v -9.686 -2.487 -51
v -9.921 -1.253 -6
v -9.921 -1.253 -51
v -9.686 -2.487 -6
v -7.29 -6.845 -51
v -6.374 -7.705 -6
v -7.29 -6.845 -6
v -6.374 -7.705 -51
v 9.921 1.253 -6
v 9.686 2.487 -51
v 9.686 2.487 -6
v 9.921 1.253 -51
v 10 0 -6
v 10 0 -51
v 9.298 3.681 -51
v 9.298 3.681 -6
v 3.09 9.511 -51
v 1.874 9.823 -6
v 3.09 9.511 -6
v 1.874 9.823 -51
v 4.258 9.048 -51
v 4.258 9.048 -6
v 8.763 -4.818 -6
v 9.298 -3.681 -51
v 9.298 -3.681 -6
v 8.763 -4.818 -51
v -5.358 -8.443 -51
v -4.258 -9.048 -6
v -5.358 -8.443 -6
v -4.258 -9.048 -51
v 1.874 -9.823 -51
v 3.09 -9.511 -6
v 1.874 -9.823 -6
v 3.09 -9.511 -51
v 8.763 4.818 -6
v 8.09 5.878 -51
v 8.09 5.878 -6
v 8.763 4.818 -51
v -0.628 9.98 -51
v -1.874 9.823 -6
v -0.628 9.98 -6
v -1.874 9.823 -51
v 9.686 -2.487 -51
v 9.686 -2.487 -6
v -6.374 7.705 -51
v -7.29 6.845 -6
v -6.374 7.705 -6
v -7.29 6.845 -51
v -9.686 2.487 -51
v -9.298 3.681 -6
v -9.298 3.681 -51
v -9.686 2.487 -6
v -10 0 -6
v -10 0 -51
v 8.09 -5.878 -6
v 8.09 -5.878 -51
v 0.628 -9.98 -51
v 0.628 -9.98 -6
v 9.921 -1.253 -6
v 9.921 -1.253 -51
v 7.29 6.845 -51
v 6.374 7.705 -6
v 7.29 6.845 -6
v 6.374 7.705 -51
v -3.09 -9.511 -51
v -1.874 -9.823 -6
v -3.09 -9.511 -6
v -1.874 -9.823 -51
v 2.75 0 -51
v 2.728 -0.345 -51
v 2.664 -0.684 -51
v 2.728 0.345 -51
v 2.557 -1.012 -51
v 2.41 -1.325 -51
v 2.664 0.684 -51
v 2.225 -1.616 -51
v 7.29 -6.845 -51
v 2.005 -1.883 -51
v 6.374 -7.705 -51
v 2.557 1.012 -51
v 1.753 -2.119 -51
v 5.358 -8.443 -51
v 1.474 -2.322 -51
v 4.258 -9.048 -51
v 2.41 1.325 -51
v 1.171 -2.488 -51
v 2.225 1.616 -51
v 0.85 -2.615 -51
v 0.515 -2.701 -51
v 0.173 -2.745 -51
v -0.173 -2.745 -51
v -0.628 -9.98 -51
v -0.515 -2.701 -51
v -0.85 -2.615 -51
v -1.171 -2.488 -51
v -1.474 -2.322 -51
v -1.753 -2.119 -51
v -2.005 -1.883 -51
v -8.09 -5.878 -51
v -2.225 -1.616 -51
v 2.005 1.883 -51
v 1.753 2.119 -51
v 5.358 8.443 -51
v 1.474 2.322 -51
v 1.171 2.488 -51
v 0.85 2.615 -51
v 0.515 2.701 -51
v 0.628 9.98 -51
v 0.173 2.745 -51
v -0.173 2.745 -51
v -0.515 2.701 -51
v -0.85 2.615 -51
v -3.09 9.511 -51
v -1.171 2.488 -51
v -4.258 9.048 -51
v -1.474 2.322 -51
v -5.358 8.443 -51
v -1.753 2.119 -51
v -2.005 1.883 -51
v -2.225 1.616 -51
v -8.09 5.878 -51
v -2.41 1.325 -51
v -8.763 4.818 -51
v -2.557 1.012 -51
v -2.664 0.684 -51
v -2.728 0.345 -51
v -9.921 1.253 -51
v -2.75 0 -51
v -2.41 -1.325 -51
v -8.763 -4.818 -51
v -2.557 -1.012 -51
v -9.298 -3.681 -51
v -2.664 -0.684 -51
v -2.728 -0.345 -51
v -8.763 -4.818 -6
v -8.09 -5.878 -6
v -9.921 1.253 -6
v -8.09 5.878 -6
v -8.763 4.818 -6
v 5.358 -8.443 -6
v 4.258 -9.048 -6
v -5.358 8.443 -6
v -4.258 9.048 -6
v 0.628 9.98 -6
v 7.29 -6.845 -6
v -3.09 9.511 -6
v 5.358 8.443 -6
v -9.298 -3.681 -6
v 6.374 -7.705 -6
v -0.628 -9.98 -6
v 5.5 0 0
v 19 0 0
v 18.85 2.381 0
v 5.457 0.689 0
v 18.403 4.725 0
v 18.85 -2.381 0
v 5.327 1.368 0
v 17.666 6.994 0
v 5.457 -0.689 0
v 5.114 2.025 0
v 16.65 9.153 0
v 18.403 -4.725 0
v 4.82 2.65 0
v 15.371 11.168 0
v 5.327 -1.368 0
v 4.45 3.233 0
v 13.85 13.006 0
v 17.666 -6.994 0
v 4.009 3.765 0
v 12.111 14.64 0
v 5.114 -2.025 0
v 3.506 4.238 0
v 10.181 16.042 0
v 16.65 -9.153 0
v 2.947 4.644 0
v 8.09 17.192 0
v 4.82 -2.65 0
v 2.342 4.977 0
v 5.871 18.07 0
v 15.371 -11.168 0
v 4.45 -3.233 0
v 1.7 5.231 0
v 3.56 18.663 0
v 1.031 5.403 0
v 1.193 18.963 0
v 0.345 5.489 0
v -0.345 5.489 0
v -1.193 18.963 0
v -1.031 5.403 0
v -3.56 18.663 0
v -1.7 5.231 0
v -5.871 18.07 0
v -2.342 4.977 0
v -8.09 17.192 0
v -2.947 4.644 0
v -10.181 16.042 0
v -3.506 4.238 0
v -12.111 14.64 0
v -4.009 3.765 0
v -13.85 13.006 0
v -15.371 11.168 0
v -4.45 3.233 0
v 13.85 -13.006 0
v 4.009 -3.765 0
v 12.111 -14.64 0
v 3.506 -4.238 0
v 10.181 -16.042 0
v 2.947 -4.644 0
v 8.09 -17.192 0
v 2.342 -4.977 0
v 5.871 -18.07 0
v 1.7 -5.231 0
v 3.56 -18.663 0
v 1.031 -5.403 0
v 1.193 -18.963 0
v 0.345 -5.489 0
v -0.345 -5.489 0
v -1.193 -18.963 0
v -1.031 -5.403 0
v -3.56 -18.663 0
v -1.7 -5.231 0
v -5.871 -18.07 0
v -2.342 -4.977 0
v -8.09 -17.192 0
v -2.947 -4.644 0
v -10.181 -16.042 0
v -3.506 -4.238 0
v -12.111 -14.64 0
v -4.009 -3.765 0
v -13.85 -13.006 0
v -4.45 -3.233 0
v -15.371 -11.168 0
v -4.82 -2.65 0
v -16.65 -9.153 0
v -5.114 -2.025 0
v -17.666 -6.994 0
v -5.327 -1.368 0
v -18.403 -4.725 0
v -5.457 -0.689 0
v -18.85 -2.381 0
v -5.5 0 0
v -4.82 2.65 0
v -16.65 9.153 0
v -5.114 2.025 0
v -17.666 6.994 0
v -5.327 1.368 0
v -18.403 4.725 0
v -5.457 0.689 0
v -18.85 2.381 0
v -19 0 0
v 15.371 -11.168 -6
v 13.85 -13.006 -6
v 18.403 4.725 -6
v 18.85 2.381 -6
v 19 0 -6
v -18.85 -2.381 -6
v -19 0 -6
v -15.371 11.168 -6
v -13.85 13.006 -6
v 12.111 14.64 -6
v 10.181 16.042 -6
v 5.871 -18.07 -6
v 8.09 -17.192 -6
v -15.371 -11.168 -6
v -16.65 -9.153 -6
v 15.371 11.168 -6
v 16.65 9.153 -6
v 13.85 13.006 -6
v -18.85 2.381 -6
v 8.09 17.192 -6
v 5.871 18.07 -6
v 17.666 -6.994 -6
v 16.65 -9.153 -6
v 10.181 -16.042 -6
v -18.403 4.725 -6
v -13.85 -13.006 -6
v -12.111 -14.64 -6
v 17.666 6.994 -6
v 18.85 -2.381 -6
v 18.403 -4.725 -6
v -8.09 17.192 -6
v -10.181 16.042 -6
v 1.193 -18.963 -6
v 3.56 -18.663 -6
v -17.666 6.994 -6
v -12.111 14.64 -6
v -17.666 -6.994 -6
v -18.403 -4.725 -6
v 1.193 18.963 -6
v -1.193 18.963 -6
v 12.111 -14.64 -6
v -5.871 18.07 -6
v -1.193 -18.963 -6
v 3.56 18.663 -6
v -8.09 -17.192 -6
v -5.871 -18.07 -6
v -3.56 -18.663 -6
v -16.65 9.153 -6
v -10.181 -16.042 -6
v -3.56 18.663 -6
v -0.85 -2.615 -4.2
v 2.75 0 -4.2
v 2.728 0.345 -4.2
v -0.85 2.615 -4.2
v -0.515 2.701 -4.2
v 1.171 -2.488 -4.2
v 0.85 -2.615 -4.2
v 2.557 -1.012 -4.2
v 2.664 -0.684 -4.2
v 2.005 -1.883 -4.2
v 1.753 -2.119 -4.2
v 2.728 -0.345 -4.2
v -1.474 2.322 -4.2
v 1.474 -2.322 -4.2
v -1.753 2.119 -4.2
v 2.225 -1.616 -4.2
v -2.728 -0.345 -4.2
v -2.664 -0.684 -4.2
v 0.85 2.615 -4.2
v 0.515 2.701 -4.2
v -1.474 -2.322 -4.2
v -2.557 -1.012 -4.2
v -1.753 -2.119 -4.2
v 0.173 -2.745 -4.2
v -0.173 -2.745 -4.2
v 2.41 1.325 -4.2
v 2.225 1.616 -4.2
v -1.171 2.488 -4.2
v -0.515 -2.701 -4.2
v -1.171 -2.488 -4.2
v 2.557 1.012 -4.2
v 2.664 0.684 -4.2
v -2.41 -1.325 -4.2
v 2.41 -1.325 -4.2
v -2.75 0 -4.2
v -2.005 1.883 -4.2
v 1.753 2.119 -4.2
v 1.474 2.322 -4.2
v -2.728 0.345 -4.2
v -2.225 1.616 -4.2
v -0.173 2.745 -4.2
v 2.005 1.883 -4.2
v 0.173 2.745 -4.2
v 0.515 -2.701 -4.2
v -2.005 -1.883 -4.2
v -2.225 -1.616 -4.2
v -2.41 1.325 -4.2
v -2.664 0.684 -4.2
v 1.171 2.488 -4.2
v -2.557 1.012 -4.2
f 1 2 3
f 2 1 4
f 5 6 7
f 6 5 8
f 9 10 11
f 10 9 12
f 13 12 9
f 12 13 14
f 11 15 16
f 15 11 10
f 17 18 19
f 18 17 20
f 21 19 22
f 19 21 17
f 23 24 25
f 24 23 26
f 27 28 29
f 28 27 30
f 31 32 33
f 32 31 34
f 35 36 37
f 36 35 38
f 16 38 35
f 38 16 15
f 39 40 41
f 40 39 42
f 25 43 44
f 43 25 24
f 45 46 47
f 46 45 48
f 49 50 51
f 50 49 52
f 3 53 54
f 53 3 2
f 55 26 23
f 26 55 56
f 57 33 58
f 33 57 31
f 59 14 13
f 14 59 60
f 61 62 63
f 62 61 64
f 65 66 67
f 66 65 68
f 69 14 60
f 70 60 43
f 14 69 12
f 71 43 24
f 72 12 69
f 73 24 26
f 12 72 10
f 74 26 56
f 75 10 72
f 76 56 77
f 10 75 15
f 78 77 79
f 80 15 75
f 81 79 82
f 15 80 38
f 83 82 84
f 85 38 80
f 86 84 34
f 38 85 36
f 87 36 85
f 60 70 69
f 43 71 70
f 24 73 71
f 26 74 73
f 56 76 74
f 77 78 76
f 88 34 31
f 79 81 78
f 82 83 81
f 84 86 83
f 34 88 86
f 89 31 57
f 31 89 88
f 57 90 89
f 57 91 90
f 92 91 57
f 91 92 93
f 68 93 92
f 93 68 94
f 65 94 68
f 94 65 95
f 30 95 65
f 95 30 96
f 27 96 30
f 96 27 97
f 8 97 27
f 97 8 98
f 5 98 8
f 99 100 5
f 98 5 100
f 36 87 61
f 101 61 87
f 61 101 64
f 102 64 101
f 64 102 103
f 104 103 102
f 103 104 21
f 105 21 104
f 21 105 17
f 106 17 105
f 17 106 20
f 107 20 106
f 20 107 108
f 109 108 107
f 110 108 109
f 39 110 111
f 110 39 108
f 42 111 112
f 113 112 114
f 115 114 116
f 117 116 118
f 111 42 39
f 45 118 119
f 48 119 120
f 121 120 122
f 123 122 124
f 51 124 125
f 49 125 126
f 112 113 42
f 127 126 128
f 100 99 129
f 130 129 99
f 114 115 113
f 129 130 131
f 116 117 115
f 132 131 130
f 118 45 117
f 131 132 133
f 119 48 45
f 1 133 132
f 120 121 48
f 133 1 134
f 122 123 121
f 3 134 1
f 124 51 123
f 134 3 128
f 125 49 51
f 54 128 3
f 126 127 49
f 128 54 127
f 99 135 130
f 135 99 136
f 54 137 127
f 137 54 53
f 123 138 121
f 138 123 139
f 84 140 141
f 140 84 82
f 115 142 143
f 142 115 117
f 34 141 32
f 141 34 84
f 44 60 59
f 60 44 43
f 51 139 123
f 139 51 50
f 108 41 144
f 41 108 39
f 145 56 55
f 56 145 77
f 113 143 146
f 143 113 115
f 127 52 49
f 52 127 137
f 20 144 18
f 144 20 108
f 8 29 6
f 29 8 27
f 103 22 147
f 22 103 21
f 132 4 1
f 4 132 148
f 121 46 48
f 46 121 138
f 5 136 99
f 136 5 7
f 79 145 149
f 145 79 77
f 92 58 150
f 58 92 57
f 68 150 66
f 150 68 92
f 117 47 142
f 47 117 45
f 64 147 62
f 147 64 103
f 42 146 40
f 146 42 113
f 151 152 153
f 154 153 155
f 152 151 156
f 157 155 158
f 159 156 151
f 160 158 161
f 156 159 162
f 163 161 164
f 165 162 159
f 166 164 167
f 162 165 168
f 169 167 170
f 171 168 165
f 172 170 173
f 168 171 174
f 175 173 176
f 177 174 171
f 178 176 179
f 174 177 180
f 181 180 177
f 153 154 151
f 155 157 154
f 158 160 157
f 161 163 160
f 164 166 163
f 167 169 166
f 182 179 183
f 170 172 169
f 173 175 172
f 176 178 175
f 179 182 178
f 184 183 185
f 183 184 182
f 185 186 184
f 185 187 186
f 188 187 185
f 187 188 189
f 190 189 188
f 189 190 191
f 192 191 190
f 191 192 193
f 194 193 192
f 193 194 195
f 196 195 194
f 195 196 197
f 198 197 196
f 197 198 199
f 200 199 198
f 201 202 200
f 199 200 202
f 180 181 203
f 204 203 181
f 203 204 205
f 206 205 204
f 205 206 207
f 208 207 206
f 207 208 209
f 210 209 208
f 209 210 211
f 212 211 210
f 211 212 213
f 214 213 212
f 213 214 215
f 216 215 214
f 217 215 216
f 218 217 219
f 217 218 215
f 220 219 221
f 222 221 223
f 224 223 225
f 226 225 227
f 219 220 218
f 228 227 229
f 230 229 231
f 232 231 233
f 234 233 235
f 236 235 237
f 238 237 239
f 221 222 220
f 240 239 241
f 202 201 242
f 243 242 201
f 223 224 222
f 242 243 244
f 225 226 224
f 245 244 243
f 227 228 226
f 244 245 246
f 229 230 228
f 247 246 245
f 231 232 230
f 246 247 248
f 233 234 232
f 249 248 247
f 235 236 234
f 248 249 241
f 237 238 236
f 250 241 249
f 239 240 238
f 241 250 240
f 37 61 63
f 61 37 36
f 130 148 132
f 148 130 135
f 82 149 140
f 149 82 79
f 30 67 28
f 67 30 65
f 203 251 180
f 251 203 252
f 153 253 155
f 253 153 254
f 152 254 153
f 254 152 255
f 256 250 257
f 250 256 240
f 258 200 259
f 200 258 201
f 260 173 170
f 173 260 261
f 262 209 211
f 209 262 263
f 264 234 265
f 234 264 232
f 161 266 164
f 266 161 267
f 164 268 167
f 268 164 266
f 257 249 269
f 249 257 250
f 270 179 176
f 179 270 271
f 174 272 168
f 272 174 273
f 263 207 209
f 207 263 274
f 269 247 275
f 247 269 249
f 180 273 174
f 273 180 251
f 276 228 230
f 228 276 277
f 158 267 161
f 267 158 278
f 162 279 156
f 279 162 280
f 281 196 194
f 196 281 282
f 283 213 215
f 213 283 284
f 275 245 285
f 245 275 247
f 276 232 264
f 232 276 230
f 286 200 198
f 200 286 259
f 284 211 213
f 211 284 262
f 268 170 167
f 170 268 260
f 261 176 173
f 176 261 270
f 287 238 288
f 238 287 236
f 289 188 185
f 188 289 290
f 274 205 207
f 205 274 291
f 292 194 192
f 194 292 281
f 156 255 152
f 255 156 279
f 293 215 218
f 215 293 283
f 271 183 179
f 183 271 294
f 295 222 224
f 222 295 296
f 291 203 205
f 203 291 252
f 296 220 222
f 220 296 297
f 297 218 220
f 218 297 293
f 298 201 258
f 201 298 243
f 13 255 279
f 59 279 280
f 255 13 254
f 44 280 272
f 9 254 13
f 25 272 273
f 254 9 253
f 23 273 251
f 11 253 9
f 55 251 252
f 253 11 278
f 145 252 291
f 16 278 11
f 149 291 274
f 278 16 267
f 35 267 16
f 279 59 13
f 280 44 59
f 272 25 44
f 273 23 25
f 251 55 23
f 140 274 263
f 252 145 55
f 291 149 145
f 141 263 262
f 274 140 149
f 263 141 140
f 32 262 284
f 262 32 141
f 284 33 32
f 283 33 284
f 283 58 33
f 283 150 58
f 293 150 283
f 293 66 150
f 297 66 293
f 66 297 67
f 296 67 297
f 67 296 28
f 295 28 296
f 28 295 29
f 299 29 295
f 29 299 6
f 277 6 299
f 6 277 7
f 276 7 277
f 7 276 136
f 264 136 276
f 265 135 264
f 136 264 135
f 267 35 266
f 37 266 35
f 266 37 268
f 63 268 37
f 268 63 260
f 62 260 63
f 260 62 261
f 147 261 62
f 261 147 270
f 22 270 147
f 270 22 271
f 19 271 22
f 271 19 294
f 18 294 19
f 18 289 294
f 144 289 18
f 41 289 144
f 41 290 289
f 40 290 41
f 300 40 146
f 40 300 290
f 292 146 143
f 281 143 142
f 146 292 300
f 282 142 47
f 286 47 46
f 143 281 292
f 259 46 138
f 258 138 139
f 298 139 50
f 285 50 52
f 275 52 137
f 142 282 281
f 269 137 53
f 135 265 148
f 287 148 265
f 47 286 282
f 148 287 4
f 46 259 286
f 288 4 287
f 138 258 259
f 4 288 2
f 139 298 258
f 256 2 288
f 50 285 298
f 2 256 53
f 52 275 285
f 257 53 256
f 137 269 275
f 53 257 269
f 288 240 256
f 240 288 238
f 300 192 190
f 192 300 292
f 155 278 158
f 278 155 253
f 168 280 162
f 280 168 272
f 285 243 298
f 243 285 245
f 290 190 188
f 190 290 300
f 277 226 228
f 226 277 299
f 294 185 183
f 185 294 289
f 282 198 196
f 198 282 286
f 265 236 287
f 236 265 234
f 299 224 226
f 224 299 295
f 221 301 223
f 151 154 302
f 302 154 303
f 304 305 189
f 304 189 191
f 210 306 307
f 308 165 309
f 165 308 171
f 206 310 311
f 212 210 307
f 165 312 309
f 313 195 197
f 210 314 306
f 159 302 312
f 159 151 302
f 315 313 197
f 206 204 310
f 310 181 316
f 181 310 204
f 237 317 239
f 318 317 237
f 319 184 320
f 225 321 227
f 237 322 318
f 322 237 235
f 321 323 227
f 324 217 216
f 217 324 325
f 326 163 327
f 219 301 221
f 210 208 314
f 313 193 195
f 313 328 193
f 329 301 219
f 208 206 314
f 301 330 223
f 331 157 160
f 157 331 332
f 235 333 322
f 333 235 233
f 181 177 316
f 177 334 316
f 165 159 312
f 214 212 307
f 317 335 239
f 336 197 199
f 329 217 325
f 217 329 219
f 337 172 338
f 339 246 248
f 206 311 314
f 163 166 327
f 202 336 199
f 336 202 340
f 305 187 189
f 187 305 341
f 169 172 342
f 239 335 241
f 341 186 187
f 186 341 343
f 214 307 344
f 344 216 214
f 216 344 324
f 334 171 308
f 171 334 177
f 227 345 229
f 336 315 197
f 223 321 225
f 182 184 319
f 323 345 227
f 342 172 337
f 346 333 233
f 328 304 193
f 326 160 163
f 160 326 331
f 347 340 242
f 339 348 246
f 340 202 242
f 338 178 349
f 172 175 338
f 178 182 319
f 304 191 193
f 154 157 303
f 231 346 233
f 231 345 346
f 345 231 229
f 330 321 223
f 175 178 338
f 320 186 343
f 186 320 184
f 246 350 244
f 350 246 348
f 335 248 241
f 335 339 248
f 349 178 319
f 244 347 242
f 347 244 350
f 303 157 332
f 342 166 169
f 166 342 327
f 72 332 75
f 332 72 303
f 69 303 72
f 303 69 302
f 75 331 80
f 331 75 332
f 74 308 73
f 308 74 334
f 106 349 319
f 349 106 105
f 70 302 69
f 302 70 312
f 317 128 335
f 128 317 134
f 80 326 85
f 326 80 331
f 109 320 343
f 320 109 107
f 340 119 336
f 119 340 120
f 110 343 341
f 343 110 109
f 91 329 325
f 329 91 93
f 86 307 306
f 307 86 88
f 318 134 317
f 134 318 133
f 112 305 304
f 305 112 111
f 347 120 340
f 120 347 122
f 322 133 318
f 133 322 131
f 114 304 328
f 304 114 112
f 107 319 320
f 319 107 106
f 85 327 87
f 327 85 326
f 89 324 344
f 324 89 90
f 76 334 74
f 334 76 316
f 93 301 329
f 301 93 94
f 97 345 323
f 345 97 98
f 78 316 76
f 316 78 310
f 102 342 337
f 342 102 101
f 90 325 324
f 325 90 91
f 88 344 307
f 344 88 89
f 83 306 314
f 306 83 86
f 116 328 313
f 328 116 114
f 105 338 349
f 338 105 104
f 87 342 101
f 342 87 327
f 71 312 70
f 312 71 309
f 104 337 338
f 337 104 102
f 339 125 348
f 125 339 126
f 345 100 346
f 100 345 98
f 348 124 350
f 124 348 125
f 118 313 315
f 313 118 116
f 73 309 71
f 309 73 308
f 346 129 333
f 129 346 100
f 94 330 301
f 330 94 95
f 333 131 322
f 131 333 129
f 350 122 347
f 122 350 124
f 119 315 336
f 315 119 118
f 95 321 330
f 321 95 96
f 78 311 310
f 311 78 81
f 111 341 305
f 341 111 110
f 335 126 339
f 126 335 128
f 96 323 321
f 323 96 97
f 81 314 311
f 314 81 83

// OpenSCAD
$fn = 50;


difference() {
	union() {
		translate(v = [0, 0, -51.0000000000]) {
			cylinder(h = 51, r = 10.0000000000);
		}
		translate(v = [0, 0, -6.0000000000]) {
			cylinder(h = 6, r = 19.0000000000);
		}
	}
	union() {
		translate(v = [0, 0, 0]) {
			rotate(a = [0, 0, 0]) {
				difference() {
					union() {
						#translate(v = [0, 0, -51.0000000000]) {
							cylinder(h = 51, r = 2.2500000000);
						}
						#translate(v = [0, 0, -4.2000000000]) {
							cylinder(h = 4.2000000000, r1 = 2.7500000000, r2 = 5.5000000000);
						}
						#translate(v = [0, 0, -51.0000000000]) {
							cylinder(h = 51, r = 2.7500000000);
						}
						#translate(v = [0, 0, -51.0000000000]) {
							cylinder(h = 51, r = 2.2500000000);
						}
					}
					union();
				}
			}
		}
	}
}
